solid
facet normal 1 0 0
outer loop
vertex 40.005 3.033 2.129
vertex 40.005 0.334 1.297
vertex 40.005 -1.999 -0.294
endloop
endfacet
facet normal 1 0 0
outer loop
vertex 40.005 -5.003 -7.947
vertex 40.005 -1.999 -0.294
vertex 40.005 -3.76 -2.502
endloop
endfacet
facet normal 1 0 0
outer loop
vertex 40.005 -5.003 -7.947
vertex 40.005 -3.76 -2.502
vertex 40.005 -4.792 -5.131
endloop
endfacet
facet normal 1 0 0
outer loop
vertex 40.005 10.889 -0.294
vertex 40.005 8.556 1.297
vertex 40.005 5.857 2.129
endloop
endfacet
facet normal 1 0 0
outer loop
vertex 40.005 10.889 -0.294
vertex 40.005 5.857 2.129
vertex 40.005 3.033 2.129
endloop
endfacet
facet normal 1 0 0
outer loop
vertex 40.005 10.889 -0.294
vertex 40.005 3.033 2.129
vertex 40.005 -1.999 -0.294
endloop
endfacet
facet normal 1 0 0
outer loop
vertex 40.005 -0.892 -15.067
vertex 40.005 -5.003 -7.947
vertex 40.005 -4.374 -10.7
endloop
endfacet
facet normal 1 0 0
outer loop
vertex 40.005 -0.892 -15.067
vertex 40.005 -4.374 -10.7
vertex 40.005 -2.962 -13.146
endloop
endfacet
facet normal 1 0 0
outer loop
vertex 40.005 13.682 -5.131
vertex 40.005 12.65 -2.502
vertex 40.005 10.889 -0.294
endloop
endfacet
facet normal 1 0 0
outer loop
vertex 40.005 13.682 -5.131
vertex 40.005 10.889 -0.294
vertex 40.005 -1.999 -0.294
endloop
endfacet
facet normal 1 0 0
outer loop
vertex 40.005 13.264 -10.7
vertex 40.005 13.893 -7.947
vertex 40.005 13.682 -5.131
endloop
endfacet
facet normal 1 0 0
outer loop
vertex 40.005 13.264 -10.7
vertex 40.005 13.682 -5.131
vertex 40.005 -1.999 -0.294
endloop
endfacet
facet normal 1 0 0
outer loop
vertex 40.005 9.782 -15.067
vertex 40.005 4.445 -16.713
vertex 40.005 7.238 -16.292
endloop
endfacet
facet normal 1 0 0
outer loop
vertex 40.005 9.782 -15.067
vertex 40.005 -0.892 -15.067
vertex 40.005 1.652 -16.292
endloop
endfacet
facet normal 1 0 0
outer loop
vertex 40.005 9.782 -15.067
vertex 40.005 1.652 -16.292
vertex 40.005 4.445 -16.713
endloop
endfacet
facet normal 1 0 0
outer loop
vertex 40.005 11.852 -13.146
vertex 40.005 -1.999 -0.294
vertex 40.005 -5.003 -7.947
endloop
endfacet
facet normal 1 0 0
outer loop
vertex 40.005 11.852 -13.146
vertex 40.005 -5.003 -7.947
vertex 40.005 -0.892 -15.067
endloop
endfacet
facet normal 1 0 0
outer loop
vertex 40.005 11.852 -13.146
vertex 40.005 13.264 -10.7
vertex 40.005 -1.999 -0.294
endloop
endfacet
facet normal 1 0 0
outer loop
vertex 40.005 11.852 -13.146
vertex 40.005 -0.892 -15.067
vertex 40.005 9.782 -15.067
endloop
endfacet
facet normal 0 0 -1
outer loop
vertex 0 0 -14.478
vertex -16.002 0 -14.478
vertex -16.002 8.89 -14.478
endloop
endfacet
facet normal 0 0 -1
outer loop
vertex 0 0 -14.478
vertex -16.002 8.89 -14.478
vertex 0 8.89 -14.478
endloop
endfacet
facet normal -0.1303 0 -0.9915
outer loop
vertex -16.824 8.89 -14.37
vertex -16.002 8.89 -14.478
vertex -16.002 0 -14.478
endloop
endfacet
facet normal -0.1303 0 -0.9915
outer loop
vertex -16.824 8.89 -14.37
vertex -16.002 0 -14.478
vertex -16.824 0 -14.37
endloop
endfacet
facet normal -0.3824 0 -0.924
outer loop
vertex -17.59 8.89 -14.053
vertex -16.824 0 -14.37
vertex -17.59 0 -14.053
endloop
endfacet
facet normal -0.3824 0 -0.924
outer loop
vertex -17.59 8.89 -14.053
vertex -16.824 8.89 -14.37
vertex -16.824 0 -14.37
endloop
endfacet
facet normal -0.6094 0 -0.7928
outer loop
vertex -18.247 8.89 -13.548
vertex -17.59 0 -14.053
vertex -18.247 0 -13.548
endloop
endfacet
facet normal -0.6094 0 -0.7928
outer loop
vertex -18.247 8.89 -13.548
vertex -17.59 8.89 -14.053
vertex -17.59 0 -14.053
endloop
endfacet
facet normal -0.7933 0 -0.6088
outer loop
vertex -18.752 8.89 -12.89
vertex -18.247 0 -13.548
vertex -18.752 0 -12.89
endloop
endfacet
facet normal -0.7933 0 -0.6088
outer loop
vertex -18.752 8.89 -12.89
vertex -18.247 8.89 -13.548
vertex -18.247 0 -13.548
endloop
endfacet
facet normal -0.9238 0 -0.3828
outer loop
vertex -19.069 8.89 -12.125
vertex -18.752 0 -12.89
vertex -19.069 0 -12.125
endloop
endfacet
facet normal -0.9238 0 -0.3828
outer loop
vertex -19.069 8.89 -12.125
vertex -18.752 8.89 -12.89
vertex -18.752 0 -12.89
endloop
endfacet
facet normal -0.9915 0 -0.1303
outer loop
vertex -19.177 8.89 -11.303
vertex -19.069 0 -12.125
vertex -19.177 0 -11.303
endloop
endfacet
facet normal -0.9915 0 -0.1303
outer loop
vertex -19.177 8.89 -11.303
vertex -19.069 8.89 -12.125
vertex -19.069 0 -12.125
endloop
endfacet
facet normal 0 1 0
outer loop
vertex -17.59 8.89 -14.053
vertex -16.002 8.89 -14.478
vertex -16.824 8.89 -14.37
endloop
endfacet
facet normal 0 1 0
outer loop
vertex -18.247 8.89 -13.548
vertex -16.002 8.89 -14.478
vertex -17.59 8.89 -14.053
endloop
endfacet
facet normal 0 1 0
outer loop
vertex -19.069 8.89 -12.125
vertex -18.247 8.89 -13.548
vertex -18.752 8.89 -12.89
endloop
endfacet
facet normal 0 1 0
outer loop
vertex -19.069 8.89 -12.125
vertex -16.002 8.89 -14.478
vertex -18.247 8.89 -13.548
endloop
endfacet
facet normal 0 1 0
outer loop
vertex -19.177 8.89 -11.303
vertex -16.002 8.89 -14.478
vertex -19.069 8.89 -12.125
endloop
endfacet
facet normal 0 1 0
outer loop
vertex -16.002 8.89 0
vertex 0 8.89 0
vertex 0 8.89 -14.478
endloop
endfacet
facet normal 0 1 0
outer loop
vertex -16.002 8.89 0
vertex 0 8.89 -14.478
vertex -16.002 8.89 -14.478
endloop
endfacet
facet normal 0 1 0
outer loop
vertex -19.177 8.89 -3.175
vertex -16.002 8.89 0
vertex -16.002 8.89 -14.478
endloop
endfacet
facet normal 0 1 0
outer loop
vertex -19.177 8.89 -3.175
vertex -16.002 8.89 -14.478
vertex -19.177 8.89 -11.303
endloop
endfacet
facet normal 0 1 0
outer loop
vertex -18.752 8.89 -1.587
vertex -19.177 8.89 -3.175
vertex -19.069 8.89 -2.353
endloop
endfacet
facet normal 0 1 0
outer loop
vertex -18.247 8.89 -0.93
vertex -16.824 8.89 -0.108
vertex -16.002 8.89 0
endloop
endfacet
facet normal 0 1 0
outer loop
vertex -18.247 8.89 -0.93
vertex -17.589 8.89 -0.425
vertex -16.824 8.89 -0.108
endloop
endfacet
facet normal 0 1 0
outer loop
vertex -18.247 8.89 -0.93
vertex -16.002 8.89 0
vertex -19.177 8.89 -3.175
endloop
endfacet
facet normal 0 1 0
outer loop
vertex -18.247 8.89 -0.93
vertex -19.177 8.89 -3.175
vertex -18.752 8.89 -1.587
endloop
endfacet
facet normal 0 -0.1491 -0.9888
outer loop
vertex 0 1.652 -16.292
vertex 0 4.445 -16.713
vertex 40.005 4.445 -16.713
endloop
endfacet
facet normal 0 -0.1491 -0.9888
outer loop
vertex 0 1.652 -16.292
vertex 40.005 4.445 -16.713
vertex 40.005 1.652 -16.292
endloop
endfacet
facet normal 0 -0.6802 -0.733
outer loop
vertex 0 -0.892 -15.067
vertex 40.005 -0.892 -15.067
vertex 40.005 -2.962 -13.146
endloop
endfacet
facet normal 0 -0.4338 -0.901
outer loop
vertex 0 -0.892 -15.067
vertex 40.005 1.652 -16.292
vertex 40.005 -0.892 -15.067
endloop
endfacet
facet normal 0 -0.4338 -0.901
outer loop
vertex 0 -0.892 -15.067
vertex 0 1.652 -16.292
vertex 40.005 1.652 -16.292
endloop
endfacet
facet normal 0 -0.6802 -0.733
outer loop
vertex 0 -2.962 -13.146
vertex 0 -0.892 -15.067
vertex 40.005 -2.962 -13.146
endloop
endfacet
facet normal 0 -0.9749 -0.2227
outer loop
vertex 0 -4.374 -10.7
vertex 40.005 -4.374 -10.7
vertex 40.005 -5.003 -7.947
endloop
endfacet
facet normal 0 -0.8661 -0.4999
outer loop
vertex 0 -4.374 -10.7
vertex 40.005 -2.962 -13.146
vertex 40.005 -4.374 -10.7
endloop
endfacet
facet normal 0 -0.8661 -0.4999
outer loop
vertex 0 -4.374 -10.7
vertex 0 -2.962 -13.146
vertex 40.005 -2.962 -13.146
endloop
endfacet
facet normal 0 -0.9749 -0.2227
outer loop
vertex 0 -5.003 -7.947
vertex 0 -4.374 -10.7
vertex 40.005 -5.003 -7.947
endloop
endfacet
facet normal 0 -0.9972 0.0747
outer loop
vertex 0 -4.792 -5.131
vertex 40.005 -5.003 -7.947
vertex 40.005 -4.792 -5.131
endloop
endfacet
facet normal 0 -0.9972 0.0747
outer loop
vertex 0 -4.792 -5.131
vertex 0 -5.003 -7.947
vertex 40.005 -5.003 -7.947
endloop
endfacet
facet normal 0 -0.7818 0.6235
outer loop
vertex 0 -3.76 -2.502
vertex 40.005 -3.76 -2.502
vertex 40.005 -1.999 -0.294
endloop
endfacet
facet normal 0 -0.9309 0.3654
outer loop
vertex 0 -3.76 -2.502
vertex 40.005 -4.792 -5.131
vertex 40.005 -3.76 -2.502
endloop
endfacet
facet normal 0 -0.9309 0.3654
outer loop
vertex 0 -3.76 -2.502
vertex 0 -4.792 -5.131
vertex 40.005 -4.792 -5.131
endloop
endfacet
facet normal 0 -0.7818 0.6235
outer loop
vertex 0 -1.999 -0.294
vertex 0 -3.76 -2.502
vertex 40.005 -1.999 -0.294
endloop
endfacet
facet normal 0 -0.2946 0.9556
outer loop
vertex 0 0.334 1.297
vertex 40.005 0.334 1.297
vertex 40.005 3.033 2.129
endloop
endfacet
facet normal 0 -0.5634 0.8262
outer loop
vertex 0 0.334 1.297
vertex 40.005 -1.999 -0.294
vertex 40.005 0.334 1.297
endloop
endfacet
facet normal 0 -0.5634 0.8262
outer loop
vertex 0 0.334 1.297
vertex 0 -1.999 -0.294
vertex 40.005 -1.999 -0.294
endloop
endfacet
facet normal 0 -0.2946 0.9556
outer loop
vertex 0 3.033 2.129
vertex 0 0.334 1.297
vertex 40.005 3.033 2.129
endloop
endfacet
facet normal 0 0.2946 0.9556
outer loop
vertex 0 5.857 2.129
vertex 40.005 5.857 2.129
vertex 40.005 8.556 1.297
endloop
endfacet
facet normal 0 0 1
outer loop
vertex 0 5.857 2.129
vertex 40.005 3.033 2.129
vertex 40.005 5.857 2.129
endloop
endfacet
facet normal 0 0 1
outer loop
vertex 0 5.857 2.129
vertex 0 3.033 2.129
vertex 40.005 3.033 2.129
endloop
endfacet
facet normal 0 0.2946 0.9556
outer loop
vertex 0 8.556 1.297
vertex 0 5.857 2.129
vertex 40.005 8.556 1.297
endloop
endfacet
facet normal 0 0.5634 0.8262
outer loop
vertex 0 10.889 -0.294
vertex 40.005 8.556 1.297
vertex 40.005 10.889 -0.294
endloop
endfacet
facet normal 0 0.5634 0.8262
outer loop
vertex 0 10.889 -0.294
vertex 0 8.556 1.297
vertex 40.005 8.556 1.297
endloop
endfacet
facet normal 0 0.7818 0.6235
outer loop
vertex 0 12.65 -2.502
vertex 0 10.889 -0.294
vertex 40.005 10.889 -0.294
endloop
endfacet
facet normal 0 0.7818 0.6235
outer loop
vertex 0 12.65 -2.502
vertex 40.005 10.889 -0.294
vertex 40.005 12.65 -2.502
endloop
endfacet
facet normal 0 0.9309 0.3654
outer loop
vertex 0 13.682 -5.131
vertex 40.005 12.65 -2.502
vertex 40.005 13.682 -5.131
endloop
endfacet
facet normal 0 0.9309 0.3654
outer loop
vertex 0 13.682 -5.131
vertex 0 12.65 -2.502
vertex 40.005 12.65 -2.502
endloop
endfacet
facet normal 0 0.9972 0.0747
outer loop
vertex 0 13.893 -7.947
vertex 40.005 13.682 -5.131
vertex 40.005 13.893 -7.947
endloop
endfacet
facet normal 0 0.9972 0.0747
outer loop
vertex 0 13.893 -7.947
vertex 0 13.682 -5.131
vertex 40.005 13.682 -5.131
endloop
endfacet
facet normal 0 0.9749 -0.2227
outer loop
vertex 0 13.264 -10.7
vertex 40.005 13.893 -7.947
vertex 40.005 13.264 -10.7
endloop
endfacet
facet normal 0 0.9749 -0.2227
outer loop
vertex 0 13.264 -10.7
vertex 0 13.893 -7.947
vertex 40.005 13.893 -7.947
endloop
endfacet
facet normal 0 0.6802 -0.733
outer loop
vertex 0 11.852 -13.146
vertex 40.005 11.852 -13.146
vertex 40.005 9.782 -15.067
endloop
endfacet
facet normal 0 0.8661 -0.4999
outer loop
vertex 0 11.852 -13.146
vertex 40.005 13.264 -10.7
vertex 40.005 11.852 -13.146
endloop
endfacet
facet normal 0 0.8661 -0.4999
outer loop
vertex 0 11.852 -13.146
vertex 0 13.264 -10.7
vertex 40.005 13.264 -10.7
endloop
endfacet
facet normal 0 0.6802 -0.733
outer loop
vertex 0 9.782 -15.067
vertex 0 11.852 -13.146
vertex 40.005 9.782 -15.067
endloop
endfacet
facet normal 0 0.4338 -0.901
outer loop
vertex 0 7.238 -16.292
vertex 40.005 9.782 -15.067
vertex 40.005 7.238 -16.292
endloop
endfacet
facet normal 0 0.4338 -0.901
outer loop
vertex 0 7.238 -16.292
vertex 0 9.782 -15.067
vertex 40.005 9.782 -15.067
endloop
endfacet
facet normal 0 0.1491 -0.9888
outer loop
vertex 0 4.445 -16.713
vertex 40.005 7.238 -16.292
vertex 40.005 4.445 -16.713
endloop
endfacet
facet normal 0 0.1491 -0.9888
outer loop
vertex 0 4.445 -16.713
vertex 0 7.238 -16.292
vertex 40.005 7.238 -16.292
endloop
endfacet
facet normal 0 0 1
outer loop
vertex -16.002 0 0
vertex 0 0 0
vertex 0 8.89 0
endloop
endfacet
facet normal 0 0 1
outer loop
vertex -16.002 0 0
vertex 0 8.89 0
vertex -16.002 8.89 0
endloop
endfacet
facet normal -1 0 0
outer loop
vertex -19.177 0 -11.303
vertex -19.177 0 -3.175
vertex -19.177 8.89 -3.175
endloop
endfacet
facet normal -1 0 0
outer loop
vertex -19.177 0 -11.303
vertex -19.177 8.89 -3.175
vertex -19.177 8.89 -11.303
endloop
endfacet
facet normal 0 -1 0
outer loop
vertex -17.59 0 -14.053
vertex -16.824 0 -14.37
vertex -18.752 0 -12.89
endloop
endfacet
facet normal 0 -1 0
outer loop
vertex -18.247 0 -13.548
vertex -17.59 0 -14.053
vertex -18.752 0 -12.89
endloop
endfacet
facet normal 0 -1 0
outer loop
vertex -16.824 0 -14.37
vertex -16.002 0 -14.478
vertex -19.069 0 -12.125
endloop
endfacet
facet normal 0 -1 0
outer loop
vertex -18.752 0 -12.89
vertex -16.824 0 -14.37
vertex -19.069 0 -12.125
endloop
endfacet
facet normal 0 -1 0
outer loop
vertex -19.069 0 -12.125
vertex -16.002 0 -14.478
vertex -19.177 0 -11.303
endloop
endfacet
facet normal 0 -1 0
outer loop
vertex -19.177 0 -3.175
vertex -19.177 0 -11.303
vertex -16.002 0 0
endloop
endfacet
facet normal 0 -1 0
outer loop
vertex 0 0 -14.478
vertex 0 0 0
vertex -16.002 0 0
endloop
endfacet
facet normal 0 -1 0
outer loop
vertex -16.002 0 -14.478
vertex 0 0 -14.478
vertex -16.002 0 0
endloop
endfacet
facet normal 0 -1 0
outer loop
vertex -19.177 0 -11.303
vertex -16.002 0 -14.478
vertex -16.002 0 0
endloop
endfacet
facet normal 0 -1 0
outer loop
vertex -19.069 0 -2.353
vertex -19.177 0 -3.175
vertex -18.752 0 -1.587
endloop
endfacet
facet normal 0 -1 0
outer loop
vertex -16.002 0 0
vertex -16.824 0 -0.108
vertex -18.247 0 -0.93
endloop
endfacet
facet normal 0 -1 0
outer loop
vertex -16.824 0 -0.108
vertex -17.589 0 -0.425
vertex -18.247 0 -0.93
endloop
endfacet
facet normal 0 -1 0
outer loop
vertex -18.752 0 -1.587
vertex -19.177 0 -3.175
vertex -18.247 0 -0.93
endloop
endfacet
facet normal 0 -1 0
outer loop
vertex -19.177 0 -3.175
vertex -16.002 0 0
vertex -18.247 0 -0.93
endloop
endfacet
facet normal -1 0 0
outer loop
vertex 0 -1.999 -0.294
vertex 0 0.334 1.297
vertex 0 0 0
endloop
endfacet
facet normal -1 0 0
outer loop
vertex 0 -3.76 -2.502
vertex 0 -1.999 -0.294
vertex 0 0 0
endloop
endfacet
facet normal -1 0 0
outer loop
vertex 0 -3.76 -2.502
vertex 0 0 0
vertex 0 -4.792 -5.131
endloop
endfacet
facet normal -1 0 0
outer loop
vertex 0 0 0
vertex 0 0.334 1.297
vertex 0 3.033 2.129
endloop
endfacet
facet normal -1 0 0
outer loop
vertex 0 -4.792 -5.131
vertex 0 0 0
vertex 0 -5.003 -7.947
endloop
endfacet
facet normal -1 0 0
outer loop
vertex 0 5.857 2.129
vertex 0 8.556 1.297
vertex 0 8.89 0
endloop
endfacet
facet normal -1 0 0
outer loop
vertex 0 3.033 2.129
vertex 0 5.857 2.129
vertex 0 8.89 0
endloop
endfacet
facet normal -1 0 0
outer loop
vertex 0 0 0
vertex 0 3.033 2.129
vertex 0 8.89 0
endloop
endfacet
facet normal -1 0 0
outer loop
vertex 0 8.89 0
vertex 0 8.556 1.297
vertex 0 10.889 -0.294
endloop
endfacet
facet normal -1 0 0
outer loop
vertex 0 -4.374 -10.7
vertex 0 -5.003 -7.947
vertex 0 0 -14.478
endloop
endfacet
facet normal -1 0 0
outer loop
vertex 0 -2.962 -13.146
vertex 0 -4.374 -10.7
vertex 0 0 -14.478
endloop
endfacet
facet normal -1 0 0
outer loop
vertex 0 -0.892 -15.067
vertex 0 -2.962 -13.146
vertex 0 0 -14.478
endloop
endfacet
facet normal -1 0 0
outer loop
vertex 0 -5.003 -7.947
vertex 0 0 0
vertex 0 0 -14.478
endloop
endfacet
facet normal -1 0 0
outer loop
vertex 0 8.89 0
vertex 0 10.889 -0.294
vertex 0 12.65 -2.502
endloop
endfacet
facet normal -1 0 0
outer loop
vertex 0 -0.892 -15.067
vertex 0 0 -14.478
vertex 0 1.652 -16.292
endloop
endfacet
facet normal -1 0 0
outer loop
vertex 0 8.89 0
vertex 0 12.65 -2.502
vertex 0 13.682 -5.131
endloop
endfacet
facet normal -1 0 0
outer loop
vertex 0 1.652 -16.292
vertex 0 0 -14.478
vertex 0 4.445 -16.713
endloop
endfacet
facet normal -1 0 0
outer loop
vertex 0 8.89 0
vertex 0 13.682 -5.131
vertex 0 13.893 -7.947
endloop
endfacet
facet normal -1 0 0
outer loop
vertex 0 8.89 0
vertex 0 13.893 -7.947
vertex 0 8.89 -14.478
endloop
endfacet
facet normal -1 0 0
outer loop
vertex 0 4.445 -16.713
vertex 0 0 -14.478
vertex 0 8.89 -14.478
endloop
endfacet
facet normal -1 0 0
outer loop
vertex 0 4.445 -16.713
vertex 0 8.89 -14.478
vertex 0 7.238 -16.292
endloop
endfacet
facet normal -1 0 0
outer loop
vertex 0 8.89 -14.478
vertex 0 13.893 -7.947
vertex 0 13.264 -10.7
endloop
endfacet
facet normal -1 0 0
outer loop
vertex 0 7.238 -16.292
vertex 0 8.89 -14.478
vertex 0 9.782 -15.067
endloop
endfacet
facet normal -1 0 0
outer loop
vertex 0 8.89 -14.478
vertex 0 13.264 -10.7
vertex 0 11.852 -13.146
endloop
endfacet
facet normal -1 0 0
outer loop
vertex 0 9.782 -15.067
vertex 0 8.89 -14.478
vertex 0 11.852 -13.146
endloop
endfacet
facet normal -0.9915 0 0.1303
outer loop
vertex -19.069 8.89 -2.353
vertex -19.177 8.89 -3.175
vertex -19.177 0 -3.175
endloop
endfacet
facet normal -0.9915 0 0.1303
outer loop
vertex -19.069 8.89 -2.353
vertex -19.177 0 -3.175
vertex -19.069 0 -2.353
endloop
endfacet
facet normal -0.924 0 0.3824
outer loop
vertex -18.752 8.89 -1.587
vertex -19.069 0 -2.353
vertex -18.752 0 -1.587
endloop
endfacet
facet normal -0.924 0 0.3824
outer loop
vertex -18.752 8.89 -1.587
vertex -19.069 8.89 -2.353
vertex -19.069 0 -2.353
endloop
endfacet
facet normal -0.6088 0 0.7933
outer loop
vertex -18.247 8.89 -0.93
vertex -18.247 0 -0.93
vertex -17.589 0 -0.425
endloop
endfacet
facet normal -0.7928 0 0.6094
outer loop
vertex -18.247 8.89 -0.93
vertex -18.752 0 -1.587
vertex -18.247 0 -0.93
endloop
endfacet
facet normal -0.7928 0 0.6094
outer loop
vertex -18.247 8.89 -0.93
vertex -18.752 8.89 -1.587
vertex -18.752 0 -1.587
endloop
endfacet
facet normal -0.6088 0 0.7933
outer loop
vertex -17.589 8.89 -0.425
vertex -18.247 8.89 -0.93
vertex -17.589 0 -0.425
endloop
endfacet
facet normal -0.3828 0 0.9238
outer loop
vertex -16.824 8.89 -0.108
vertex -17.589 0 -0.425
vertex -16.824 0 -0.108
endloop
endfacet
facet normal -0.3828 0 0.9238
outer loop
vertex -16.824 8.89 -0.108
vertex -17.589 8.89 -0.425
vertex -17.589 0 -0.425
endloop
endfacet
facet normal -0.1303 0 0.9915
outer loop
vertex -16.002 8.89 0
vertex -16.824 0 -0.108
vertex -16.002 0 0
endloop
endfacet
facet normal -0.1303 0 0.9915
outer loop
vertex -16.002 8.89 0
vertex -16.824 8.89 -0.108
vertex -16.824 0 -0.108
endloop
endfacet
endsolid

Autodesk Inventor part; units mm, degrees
ref_plane "YZ Plane" through (0, 0, 0) normal (1, 0, 0) x (0, 1, 0)
ref_plane "XZ Plane" through (0, 0, 0) normal (0, 1, 0) x (-1, 0, 0)
ref_plane "XY Plane" through (0, 0, 0) normal (0, 0, 1) x (1, 0, 0)
sketch "Sketch1" plane through (0, 0, 0) normal (0, 1, 0) x (-1, 0, 0)
  line L0 (0, 0) -> (19.177, 0)
  line L1 (19.177, 0) -> (19.177, -14.478)
  line L2 (19.177, -14.478) -> (0, -14.478)
  line L3 (0, -14.478) -> (0, 0)
  dimension "d0" = 19.177
  dimension "d1" = 14.478
extrude "Extrusion1" add sketch "Sketch1" along normal blind 8.89
sketch "Sketch2" plane through (0, 0, 0) normal (1, 0, 0) x (0, 0, -1)
  circle A0 centre (7.239, 4.445) radius 9.4742
  line L0 (0, 8.89) -> (14.478, 8.89) projected
  line L1 (0, 0) -> (0, 8.89) projected
  line L2 (14.478, 0) -> (0, 0) projected
  line L3 (0, 0) -> (0, 8.89) projected
  point P0 (7.239, 0)
  point P1 (0, 4.445)
  dimension "d4" = 18.9484
  dimension "d9" = 0
  dimension "d10" = 0
extrude "Extrusion2" add sketch "Sketch2" along normal blind 40.005
fillet "Fillet1" radius 3.175 2 edges at (-19.177, 4.445, 0) (-19.177, 4.445, -14.478)
properties part number "Part6 x 2"
